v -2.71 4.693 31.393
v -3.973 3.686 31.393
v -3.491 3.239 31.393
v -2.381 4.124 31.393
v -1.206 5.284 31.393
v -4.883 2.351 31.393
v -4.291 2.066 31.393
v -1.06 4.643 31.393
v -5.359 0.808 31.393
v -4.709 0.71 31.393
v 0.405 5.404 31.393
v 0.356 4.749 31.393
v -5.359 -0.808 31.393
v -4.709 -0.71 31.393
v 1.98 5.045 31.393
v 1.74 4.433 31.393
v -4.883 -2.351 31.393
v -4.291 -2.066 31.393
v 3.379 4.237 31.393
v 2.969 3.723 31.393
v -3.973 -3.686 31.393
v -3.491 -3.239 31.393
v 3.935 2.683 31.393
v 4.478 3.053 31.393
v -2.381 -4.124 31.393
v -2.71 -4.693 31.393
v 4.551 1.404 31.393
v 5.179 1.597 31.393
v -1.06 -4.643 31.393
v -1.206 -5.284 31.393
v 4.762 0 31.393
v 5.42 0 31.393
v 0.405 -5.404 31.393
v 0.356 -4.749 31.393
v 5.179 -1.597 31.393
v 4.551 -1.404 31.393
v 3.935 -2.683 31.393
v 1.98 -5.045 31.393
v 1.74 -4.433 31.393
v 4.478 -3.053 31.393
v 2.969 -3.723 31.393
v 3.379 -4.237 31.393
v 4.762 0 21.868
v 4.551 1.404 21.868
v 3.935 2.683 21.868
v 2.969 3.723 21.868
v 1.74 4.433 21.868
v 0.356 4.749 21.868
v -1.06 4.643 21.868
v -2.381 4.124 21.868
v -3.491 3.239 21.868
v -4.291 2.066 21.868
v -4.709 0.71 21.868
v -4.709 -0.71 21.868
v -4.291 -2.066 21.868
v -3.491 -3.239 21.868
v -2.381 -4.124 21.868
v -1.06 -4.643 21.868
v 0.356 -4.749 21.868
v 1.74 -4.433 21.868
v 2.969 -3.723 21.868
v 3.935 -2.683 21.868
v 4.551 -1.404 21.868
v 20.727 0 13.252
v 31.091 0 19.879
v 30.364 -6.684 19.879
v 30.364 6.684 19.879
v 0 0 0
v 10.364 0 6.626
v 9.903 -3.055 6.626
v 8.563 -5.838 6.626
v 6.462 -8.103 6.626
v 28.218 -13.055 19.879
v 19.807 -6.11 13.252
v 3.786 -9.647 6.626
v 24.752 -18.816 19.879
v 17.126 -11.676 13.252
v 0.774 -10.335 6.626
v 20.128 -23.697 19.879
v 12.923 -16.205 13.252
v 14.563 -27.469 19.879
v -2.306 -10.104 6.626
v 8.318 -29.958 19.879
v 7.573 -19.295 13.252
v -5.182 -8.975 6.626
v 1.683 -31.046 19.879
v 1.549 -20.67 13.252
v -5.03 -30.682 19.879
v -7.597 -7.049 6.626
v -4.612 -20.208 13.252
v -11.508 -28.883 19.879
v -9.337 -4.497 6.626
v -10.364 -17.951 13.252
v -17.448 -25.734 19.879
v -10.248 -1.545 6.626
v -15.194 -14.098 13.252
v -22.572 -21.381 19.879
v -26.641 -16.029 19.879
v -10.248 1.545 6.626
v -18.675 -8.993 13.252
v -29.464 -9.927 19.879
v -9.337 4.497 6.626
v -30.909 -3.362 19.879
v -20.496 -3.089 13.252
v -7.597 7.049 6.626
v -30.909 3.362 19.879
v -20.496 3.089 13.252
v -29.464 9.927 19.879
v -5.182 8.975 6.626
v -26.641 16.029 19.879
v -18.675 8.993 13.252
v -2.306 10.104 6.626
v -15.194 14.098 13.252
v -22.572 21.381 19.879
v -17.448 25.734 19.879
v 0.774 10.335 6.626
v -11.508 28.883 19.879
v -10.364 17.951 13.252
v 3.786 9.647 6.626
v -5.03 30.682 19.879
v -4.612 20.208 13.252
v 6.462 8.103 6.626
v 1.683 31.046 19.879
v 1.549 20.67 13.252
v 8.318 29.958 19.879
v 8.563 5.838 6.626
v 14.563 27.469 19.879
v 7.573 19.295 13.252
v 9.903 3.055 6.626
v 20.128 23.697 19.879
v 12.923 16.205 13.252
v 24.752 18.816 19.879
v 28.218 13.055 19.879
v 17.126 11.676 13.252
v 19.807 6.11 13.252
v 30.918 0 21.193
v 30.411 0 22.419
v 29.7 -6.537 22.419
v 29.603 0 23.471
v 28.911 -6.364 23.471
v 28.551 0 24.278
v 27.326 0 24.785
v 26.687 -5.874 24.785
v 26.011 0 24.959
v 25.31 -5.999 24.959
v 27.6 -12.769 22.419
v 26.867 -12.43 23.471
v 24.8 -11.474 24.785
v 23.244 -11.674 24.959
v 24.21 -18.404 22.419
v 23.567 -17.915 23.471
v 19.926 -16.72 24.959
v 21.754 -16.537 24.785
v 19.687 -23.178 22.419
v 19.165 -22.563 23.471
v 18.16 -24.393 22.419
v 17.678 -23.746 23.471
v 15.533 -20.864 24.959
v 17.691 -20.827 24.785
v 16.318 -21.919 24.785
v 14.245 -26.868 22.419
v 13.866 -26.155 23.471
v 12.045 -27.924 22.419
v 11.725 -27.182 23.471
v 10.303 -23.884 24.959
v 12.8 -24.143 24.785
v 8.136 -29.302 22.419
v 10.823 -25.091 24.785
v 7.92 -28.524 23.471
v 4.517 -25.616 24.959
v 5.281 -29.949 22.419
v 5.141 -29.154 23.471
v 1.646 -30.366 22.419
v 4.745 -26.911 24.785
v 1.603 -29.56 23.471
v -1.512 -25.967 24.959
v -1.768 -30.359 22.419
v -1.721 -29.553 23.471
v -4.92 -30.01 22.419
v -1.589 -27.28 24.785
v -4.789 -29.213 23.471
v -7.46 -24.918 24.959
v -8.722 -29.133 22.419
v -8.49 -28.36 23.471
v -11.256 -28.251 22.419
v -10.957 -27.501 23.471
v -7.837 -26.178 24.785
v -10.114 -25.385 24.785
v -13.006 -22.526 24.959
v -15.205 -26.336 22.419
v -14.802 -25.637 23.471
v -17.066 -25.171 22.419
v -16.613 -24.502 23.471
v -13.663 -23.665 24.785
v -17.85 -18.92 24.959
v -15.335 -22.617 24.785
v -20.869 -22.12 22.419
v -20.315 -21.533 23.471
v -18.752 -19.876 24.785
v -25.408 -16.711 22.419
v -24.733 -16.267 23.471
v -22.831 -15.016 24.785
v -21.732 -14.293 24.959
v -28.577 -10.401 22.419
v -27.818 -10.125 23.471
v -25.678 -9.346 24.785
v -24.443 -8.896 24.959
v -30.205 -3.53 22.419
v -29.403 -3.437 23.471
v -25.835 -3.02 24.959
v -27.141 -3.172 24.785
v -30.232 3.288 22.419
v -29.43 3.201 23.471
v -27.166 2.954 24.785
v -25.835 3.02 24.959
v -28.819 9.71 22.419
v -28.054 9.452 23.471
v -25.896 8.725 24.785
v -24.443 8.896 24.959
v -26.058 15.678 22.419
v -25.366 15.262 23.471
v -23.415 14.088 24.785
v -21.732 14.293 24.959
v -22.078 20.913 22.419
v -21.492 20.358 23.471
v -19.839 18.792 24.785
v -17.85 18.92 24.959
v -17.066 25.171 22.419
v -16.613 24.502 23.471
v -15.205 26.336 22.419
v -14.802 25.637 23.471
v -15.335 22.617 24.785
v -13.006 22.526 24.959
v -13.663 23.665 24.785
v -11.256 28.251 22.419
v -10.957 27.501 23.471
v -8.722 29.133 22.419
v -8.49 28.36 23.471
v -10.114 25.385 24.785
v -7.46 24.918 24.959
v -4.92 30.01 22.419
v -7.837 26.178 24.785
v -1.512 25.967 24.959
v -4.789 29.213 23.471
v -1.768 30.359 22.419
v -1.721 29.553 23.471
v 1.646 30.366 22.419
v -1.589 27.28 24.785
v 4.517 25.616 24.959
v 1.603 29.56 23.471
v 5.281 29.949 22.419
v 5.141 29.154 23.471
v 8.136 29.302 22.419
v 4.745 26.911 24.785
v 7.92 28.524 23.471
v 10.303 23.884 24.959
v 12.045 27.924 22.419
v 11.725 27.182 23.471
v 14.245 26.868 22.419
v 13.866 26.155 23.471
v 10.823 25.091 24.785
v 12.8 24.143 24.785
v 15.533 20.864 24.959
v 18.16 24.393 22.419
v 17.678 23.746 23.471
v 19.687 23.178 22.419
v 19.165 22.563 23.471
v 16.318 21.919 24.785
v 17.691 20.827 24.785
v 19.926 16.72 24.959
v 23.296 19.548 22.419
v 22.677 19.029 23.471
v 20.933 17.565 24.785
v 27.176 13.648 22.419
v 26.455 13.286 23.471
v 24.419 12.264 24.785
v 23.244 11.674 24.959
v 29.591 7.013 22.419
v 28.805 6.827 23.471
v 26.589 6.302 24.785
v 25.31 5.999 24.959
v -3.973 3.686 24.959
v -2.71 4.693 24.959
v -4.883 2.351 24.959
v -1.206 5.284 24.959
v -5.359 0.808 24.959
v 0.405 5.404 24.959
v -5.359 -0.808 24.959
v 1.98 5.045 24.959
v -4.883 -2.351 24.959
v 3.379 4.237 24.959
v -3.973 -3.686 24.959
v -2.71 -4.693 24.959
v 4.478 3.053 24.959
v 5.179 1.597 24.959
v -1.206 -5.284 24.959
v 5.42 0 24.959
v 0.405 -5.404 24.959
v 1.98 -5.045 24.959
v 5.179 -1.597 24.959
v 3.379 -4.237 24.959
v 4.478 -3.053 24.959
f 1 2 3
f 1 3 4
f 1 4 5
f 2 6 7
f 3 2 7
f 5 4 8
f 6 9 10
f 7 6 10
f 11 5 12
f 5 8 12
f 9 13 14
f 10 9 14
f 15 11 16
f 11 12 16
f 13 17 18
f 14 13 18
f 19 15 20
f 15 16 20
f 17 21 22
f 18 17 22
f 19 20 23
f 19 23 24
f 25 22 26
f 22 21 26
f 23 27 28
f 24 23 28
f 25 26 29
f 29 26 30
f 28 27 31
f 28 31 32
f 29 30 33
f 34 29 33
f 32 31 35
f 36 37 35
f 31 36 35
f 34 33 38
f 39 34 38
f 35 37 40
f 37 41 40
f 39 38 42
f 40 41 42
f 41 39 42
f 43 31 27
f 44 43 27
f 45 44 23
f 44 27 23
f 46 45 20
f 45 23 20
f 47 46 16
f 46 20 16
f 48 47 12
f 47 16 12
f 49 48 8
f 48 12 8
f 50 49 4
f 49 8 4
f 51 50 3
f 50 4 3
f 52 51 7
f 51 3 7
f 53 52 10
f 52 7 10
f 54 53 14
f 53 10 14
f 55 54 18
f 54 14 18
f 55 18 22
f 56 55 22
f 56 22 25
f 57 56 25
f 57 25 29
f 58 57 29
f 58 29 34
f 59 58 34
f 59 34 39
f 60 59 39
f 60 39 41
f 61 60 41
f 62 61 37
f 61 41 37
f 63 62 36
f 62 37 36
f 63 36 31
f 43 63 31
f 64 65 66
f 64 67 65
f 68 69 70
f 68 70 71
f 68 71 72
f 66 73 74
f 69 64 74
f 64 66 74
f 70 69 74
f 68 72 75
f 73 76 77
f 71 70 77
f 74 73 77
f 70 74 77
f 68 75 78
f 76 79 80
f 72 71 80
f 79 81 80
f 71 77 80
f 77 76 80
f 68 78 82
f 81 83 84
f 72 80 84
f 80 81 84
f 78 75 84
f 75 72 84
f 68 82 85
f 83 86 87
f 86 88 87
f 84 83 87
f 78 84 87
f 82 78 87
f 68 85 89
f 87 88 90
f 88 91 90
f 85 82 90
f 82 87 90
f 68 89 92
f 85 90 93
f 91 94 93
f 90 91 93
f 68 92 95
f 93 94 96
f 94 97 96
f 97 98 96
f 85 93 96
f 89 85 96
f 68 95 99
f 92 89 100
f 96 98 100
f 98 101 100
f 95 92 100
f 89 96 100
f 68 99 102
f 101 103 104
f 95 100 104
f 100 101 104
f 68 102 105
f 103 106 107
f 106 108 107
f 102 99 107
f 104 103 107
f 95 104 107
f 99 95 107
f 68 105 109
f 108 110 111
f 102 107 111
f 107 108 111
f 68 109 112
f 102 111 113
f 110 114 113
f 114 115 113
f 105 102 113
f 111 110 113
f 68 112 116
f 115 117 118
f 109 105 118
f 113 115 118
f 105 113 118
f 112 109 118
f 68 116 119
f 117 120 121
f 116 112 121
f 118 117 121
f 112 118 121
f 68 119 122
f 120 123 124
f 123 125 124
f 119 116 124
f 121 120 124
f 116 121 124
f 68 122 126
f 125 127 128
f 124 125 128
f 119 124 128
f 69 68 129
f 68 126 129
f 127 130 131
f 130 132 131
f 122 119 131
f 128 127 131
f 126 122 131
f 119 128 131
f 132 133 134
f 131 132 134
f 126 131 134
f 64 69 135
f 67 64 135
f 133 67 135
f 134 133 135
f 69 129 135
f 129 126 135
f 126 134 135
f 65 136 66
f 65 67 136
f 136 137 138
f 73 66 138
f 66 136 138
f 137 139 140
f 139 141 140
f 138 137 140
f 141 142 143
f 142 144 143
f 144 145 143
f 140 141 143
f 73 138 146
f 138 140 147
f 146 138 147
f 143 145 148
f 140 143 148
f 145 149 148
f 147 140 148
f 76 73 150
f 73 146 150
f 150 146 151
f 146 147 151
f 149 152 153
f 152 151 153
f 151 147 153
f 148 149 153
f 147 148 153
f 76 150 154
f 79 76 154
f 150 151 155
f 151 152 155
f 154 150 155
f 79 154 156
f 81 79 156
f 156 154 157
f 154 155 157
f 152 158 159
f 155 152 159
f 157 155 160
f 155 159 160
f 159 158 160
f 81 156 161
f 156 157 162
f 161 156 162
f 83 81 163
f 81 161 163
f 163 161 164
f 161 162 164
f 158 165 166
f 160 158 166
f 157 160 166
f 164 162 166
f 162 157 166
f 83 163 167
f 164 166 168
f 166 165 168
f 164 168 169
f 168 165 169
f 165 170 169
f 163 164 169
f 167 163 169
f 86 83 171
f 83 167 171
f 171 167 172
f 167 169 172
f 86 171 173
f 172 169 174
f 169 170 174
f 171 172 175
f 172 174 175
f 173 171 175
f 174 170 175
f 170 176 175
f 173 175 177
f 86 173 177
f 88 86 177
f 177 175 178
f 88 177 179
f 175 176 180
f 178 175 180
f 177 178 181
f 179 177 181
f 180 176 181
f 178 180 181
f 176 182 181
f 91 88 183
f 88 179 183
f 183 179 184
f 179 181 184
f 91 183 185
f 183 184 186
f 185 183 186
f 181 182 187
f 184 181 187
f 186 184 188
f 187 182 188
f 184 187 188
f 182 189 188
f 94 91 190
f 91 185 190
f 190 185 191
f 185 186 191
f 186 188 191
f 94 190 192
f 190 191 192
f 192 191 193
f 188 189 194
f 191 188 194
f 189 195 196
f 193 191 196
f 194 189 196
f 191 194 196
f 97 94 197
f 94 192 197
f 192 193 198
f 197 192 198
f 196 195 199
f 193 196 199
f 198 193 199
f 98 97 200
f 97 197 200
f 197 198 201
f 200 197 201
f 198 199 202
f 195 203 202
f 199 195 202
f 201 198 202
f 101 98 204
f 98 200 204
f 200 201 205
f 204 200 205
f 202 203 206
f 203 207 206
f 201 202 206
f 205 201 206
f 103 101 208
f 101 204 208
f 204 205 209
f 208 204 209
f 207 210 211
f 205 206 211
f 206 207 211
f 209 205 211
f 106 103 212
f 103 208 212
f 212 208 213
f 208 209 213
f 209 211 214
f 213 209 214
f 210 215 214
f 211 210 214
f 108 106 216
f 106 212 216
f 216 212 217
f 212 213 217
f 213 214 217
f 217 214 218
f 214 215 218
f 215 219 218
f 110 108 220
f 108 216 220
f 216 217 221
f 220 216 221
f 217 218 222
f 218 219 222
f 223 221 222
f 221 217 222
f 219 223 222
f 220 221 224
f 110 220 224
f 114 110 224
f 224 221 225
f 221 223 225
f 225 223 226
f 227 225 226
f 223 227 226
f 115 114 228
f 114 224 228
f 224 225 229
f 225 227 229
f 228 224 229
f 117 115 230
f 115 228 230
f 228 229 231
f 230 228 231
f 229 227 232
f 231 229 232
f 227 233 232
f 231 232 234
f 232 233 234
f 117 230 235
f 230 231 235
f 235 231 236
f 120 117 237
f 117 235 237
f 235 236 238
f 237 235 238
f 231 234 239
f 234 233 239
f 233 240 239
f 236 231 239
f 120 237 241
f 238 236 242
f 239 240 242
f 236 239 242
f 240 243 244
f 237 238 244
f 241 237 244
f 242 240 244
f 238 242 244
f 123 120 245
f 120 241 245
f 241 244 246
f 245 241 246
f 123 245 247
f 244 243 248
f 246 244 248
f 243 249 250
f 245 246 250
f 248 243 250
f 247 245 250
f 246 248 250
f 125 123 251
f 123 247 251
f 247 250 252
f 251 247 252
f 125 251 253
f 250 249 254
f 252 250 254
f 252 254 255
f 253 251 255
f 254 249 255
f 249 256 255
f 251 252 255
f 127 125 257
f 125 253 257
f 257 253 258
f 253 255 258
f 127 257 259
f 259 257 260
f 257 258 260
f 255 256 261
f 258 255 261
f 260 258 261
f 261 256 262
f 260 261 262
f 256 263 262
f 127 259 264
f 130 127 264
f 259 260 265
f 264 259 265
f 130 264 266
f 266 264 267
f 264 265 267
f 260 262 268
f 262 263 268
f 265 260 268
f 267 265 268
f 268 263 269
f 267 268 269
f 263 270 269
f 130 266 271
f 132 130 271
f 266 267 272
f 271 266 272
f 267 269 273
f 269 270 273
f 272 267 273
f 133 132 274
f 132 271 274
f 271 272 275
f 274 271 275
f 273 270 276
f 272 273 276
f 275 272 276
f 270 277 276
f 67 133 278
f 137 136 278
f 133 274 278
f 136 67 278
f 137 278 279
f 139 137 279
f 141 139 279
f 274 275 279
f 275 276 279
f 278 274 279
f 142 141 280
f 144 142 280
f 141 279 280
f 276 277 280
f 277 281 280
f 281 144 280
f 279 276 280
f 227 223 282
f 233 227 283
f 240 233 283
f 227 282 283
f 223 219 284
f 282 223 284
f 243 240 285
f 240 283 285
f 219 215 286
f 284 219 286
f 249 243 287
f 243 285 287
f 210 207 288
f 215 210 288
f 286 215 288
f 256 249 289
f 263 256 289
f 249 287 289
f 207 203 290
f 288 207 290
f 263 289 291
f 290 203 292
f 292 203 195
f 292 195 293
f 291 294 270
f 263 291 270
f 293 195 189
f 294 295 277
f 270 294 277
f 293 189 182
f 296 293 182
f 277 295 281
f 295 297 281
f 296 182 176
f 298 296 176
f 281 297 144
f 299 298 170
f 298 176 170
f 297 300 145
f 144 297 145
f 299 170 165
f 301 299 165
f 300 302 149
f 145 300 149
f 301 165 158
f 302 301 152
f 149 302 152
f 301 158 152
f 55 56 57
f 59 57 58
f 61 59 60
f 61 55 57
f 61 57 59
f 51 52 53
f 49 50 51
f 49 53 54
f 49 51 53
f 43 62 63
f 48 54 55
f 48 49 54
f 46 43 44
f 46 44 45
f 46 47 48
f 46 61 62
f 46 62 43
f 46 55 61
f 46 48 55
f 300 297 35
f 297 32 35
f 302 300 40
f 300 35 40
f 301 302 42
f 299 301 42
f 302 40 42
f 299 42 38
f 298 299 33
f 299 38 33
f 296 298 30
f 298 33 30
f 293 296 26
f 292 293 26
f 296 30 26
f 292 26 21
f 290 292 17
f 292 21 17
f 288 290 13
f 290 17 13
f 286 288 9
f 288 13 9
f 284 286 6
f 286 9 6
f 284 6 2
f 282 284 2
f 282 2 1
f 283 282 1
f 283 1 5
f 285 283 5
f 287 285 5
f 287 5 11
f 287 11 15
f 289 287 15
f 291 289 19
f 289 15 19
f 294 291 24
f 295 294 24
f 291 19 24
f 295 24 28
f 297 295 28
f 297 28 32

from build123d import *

# Parameters (mm, degrees)
F2_R     = 4.7625
F3_DEPTH = 9.525
F4_R     = 5.07999


# Not quite as in the source:
# - a fillet or chamfer is up to 0.001 mm smaller than in the source, because OpenCascade refuses the exact size


with BuildPart() as f1:
    # F0 (on Front) → F1 (revolve)
    with BuildSketch(Plane.XZ):
        Polygon((0, 31.392690606), (0, 0), (31.0912281275, 19.8785602432), (31.0912281275, 24.9585602432), (5.4195728153, 24.9585602432), (5.4195728153, 31.392690606), align=None)
    revolve(axis=Axis((0, 0, 15.696345303), (0, 0, -1)))

    # F2 (on face) → F3 (cut)
    with BuildSketch(Plane.XY.offset(31.392690606)):
        Circle(F2_R)
    extrude(amount=-F3_DEPTH, mode=Mode.SUBTRACT)

    # F4 (radius 5.08 in the source; OpenCascade refuses exactly that, so slightly less here)
    f4_edges = [f1.edges().sort_by_distance(p)[0] for p in [
        (-31.091228, 0, 24.95856),
    ]]
    fillet(f4_edges, radius=F4_R)


solid = f1.part
